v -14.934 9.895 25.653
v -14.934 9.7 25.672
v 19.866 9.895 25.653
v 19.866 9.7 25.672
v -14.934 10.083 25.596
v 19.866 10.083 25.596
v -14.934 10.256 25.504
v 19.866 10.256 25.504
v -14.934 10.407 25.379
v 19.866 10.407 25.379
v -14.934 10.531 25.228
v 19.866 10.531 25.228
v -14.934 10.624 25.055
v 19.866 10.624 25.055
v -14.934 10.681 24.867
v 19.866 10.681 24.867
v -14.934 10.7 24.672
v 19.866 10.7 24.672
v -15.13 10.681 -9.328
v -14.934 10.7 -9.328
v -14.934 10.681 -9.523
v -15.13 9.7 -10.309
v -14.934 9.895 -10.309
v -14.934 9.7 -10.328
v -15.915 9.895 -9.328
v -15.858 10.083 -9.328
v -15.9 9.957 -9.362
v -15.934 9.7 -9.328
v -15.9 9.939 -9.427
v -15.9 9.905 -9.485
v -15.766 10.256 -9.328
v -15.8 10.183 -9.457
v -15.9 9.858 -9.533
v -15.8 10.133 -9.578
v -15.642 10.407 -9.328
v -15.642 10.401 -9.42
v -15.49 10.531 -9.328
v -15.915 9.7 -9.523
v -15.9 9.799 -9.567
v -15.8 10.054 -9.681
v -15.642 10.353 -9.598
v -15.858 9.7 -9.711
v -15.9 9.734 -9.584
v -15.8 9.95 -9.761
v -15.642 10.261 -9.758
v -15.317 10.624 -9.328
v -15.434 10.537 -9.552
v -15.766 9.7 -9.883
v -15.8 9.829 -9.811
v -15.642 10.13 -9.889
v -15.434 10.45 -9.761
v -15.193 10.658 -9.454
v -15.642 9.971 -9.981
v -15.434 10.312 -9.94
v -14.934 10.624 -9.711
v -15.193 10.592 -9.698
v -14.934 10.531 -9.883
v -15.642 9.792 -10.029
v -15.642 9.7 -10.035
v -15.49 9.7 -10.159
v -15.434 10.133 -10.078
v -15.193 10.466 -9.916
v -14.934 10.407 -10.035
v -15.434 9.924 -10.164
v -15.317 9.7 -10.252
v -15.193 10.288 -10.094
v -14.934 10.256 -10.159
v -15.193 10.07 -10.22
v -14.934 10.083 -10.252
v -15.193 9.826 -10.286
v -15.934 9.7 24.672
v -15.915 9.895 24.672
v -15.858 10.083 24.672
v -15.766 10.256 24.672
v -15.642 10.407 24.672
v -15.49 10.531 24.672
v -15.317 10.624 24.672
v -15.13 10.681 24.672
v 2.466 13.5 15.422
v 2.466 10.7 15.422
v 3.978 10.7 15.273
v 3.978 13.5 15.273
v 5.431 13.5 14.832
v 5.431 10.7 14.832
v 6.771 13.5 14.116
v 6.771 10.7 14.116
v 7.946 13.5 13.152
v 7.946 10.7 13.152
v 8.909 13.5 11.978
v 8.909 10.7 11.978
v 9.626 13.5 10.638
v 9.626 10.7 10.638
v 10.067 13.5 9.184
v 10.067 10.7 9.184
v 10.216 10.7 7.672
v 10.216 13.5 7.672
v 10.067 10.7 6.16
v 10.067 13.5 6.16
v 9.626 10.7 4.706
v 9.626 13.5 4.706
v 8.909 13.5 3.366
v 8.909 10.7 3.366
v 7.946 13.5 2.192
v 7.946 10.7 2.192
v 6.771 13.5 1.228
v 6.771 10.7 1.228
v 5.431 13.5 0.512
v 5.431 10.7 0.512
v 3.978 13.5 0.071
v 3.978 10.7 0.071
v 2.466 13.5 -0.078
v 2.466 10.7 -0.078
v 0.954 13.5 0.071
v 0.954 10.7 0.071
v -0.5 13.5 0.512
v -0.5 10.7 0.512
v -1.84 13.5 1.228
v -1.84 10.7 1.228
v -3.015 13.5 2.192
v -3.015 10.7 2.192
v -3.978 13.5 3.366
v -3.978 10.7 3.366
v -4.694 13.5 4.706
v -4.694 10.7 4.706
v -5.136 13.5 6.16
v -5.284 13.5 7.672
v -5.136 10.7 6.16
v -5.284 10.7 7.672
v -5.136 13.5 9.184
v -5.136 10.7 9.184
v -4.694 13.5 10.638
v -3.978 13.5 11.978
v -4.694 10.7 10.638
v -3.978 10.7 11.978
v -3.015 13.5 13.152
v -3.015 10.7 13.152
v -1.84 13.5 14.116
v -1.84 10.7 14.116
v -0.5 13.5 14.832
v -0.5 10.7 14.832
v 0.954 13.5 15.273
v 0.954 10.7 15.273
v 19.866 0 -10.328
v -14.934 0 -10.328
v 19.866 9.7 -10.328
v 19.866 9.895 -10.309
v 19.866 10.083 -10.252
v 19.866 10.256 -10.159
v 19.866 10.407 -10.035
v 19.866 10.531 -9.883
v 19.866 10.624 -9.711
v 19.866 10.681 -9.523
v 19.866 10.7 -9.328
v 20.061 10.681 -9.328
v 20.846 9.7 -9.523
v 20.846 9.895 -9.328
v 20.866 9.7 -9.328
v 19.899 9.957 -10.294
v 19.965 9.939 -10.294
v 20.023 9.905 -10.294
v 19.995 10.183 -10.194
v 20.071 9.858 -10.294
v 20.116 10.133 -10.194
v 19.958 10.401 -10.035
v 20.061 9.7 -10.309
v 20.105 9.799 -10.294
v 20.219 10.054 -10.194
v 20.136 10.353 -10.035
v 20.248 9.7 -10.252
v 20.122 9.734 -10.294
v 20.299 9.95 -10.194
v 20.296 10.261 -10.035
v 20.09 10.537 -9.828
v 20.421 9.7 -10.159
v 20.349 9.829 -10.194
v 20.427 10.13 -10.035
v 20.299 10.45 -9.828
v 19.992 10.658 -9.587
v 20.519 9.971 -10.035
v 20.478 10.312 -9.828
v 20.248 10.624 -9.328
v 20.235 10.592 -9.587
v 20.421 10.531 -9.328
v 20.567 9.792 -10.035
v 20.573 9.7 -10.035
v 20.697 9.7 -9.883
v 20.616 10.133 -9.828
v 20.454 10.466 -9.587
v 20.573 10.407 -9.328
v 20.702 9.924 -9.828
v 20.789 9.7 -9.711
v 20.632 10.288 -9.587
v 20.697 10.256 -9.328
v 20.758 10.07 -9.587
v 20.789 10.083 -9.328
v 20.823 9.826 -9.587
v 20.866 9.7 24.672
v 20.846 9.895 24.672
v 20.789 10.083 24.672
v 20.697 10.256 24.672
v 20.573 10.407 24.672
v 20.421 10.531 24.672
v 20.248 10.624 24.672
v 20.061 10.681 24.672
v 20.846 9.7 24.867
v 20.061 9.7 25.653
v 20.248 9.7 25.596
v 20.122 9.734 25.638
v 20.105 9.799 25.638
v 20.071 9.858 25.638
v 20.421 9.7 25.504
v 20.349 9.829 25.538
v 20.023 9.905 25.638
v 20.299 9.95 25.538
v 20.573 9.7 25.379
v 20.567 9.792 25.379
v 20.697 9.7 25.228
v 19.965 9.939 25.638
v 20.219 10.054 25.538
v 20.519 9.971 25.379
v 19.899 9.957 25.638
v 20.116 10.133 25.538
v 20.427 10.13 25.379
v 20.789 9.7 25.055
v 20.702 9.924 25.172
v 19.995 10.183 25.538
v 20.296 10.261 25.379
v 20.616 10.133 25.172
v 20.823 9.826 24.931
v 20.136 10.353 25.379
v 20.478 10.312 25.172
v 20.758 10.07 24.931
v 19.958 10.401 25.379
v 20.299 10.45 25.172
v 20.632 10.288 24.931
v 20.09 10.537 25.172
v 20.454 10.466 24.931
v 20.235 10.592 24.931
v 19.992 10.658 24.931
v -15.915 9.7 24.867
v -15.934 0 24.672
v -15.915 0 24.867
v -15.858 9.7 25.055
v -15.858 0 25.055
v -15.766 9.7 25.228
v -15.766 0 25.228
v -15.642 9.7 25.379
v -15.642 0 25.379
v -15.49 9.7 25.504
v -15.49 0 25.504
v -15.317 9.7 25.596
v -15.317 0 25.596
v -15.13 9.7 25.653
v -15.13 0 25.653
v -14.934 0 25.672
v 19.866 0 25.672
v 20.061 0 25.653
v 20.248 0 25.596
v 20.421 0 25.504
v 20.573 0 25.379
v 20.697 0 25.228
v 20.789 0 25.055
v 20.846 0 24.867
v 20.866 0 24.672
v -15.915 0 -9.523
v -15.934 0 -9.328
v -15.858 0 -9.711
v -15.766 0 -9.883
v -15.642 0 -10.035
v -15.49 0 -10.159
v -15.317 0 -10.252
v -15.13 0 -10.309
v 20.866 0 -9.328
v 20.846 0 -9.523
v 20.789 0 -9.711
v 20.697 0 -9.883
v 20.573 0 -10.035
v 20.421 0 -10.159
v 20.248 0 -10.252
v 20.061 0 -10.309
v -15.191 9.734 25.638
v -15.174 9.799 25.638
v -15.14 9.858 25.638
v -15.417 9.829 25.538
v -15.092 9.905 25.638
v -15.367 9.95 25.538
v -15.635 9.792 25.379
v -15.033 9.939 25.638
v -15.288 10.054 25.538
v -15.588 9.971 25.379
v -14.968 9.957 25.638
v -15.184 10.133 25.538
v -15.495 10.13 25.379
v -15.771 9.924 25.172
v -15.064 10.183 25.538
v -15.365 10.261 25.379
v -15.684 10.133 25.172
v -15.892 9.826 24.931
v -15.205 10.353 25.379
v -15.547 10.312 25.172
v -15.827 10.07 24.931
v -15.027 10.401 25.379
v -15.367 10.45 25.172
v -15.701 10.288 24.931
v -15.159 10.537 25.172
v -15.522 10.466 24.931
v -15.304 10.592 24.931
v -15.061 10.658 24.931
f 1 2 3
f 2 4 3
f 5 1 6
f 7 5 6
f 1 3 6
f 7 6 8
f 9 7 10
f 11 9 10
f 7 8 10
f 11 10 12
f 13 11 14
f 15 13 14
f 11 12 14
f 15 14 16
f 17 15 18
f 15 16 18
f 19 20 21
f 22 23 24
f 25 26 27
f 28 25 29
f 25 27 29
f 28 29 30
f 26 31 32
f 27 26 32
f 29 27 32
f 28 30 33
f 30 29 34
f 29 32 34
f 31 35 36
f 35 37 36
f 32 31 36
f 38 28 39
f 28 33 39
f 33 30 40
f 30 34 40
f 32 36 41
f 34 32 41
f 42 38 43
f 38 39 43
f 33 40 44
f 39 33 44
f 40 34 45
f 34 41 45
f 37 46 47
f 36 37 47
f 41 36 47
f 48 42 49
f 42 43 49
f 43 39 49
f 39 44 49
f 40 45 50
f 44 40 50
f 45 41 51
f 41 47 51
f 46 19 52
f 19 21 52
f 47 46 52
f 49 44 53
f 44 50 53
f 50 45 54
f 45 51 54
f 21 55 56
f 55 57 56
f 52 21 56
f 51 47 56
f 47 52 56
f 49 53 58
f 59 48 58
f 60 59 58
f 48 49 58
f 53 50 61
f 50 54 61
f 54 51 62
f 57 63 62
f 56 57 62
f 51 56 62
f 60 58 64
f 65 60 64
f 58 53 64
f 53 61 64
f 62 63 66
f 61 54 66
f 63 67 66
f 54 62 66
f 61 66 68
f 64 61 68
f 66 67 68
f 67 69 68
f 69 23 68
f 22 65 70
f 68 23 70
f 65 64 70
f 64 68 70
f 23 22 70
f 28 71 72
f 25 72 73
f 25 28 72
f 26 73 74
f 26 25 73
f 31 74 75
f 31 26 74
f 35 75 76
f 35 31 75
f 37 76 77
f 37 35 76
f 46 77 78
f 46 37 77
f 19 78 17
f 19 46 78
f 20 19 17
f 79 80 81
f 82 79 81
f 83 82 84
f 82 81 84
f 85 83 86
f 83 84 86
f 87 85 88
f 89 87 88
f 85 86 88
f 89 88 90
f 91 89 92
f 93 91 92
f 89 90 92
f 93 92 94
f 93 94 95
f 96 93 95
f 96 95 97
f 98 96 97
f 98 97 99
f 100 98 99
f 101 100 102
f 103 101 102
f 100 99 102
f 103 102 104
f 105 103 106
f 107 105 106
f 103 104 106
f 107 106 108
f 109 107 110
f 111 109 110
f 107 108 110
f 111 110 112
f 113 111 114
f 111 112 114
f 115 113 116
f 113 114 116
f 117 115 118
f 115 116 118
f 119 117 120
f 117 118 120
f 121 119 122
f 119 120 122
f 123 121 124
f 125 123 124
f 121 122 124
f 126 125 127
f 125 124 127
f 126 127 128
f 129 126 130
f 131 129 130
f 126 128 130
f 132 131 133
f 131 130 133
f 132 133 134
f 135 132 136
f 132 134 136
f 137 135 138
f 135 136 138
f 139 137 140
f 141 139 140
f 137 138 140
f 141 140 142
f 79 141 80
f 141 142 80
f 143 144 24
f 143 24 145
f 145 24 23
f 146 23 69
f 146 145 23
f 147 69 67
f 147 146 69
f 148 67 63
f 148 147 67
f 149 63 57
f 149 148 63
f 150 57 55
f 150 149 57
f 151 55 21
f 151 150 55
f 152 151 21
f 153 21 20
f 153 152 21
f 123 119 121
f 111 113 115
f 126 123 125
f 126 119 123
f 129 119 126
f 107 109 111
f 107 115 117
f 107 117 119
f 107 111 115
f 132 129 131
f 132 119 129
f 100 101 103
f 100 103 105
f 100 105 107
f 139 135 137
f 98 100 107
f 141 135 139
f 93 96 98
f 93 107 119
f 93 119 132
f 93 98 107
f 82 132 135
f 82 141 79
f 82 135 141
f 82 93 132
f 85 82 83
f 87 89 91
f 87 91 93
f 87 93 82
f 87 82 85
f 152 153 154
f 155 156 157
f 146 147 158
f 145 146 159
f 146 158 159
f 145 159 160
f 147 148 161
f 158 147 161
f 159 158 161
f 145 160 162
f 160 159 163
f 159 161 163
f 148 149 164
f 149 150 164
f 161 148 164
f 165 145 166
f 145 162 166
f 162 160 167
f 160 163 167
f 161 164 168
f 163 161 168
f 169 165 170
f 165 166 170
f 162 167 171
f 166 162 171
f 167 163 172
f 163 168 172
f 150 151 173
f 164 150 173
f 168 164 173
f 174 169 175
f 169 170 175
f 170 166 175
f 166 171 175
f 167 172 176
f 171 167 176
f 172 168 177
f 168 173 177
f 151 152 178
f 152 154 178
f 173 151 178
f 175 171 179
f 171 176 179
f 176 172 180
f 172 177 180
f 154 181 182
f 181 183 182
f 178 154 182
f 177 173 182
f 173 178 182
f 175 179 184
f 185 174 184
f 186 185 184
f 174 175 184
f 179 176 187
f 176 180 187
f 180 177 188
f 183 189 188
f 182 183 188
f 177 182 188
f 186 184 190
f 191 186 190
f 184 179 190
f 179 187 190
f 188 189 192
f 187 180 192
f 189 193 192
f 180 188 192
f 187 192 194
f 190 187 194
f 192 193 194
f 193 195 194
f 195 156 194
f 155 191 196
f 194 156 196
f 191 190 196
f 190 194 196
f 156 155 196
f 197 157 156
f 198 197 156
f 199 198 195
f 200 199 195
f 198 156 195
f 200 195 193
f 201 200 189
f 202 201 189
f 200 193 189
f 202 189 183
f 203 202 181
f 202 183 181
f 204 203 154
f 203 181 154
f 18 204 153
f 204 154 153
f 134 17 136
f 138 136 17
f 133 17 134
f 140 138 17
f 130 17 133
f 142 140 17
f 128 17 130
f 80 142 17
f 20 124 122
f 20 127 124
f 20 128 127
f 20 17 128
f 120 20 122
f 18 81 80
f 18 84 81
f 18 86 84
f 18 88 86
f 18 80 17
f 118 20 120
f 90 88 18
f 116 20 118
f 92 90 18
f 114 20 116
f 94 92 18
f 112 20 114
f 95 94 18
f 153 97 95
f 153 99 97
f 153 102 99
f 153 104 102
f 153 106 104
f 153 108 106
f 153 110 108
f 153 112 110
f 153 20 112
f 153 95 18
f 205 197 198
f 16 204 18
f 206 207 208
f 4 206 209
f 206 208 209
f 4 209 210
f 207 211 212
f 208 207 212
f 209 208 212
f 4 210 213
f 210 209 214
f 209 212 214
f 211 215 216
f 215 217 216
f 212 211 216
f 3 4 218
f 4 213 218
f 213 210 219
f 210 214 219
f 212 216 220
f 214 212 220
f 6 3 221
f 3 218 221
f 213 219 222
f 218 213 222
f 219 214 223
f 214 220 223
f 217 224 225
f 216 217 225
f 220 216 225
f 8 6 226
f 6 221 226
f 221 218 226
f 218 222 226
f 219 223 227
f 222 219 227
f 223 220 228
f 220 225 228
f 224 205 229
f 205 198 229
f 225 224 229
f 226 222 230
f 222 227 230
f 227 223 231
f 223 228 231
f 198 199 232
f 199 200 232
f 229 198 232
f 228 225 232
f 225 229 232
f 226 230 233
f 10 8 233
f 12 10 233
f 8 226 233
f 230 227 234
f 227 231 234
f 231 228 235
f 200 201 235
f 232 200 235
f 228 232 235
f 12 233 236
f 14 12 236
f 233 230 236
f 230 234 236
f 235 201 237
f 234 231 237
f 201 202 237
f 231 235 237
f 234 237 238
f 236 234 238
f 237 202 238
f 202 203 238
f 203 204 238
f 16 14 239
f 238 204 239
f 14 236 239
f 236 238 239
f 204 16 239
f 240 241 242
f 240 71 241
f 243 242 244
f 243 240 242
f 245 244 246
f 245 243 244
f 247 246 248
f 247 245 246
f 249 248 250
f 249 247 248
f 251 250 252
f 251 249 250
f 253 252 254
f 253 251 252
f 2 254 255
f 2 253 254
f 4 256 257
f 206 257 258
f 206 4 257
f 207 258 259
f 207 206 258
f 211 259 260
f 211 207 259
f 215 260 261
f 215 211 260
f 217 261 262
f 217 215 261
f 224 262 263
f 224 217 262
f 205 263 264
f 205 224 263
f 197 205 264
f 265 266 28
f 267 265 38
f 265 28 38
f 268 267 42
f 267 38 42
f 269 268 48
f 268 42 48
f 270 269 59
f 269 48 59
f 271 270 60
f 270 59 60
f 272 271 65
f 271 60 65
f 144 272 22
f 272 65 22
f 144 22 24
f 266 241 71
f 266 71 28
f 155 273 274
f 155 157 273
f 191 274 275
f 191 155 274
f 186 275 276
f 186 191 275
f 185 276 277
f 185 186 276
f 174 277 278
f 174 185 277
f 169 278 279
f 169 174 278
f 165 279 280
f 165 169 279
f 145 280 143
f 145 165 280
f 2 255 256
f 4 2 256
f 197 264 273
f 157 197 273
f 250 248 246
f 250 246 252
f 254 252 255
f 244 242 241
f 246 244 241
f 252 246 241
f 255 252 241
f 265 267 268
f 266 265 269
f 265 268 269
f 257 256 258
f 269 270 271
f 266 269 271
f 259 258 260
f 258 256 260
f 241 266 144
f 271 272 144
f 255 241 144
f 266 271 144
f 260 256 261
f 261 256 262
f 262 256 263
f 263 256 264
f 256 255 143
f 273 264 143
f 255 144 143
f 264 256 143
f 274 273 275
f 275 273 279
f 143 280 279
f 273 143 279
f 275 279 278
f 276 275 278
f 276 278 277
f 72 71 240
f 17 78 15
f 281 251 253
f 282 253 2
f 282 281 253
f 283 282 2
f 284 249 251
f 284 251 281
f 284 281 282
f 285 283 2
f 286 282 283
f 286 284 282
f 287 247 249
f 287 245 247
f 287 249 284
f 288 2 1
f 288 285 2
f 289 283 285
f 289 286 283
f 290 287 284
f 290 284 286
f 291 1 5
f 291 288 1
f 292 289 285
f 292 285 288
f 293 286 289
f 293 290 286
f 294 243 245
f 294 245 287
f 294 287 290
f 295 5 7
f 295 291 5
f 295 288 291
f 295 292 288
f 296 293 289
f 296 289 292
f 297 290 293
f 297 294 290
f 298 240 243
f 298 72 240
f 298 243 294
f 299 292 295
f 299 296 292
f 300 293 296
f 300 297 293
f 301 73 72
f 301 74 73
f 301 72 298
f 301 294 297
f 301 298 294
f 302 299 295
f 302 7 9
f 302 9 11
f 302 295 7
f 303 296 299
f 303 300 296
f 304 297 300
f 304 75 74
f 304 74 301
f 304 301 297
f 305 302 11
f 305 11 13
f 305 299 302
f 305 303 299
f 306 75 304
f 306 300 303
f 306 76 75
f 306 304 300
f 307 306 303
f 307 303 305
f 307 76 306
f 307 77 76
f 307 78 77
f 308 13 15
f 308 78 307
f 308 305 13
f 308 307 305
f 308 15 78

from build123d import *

# Parameters (mm, degrees)
SKETCH_1_W      = 36.8
SKETCH_1_H      = 36
EXTRUDE_1_DEPTH = 10.7
FILLET_1_R      = 1
SKETCH_2_R      = 7.75
EXTRUDE_2_DEPTH = 2.8


with BuildPart() as part:
    # 草图1 → 凸台-拉伸1 (new body)
    with BuildSketch(Plane(origin=(0, 0, 0), x_dir=(1, 0, 0), z_dir=(0, 1, 0))):
        with Locations((2.46557377, -7.672131148)):
            Rectangle(SKETCH_1_W, SKETCH_1_H)
    extrude(amount=EXTRUDE_1_DEPTH)

    # 圆角1
    fillet_1_edges = [part.edges().sort_by_distance(p)[0] for p in [
        (20.86557377, 10.7, 7.672131148),
        (2.46557377, 10.7, -10.327868852),
        (-15.93442623, 10.7, 7.672131148),
        (-15.93442623, 5.35, -10.327868852),
        (20.86557377, 5.35, -10.327868852),
        (20.86557377, 5.35, 25.672131148),
        (-15.93442623, 5.35, 25.672131148),
        (2.46557377, 10.7, 25.672131148),
    ]]
    fillet(fillet_1_edges, radius=FILLET_1_R)

    # 草图2 → 凸台-拉伸2 (add)
    with BuildSketch(Plane(origin=(0, 10.7, 0), x_dir=(1, 0, 0), z_dir=(0, 1, 0))):
        with Locations(Location((2.46557377, -7.672131148, 0), (0, 0, 270))):
            Circle(SKETCH_2_R)
    extrude(amount=EXTRUDE_2_DEPTH)


solid = part.part
